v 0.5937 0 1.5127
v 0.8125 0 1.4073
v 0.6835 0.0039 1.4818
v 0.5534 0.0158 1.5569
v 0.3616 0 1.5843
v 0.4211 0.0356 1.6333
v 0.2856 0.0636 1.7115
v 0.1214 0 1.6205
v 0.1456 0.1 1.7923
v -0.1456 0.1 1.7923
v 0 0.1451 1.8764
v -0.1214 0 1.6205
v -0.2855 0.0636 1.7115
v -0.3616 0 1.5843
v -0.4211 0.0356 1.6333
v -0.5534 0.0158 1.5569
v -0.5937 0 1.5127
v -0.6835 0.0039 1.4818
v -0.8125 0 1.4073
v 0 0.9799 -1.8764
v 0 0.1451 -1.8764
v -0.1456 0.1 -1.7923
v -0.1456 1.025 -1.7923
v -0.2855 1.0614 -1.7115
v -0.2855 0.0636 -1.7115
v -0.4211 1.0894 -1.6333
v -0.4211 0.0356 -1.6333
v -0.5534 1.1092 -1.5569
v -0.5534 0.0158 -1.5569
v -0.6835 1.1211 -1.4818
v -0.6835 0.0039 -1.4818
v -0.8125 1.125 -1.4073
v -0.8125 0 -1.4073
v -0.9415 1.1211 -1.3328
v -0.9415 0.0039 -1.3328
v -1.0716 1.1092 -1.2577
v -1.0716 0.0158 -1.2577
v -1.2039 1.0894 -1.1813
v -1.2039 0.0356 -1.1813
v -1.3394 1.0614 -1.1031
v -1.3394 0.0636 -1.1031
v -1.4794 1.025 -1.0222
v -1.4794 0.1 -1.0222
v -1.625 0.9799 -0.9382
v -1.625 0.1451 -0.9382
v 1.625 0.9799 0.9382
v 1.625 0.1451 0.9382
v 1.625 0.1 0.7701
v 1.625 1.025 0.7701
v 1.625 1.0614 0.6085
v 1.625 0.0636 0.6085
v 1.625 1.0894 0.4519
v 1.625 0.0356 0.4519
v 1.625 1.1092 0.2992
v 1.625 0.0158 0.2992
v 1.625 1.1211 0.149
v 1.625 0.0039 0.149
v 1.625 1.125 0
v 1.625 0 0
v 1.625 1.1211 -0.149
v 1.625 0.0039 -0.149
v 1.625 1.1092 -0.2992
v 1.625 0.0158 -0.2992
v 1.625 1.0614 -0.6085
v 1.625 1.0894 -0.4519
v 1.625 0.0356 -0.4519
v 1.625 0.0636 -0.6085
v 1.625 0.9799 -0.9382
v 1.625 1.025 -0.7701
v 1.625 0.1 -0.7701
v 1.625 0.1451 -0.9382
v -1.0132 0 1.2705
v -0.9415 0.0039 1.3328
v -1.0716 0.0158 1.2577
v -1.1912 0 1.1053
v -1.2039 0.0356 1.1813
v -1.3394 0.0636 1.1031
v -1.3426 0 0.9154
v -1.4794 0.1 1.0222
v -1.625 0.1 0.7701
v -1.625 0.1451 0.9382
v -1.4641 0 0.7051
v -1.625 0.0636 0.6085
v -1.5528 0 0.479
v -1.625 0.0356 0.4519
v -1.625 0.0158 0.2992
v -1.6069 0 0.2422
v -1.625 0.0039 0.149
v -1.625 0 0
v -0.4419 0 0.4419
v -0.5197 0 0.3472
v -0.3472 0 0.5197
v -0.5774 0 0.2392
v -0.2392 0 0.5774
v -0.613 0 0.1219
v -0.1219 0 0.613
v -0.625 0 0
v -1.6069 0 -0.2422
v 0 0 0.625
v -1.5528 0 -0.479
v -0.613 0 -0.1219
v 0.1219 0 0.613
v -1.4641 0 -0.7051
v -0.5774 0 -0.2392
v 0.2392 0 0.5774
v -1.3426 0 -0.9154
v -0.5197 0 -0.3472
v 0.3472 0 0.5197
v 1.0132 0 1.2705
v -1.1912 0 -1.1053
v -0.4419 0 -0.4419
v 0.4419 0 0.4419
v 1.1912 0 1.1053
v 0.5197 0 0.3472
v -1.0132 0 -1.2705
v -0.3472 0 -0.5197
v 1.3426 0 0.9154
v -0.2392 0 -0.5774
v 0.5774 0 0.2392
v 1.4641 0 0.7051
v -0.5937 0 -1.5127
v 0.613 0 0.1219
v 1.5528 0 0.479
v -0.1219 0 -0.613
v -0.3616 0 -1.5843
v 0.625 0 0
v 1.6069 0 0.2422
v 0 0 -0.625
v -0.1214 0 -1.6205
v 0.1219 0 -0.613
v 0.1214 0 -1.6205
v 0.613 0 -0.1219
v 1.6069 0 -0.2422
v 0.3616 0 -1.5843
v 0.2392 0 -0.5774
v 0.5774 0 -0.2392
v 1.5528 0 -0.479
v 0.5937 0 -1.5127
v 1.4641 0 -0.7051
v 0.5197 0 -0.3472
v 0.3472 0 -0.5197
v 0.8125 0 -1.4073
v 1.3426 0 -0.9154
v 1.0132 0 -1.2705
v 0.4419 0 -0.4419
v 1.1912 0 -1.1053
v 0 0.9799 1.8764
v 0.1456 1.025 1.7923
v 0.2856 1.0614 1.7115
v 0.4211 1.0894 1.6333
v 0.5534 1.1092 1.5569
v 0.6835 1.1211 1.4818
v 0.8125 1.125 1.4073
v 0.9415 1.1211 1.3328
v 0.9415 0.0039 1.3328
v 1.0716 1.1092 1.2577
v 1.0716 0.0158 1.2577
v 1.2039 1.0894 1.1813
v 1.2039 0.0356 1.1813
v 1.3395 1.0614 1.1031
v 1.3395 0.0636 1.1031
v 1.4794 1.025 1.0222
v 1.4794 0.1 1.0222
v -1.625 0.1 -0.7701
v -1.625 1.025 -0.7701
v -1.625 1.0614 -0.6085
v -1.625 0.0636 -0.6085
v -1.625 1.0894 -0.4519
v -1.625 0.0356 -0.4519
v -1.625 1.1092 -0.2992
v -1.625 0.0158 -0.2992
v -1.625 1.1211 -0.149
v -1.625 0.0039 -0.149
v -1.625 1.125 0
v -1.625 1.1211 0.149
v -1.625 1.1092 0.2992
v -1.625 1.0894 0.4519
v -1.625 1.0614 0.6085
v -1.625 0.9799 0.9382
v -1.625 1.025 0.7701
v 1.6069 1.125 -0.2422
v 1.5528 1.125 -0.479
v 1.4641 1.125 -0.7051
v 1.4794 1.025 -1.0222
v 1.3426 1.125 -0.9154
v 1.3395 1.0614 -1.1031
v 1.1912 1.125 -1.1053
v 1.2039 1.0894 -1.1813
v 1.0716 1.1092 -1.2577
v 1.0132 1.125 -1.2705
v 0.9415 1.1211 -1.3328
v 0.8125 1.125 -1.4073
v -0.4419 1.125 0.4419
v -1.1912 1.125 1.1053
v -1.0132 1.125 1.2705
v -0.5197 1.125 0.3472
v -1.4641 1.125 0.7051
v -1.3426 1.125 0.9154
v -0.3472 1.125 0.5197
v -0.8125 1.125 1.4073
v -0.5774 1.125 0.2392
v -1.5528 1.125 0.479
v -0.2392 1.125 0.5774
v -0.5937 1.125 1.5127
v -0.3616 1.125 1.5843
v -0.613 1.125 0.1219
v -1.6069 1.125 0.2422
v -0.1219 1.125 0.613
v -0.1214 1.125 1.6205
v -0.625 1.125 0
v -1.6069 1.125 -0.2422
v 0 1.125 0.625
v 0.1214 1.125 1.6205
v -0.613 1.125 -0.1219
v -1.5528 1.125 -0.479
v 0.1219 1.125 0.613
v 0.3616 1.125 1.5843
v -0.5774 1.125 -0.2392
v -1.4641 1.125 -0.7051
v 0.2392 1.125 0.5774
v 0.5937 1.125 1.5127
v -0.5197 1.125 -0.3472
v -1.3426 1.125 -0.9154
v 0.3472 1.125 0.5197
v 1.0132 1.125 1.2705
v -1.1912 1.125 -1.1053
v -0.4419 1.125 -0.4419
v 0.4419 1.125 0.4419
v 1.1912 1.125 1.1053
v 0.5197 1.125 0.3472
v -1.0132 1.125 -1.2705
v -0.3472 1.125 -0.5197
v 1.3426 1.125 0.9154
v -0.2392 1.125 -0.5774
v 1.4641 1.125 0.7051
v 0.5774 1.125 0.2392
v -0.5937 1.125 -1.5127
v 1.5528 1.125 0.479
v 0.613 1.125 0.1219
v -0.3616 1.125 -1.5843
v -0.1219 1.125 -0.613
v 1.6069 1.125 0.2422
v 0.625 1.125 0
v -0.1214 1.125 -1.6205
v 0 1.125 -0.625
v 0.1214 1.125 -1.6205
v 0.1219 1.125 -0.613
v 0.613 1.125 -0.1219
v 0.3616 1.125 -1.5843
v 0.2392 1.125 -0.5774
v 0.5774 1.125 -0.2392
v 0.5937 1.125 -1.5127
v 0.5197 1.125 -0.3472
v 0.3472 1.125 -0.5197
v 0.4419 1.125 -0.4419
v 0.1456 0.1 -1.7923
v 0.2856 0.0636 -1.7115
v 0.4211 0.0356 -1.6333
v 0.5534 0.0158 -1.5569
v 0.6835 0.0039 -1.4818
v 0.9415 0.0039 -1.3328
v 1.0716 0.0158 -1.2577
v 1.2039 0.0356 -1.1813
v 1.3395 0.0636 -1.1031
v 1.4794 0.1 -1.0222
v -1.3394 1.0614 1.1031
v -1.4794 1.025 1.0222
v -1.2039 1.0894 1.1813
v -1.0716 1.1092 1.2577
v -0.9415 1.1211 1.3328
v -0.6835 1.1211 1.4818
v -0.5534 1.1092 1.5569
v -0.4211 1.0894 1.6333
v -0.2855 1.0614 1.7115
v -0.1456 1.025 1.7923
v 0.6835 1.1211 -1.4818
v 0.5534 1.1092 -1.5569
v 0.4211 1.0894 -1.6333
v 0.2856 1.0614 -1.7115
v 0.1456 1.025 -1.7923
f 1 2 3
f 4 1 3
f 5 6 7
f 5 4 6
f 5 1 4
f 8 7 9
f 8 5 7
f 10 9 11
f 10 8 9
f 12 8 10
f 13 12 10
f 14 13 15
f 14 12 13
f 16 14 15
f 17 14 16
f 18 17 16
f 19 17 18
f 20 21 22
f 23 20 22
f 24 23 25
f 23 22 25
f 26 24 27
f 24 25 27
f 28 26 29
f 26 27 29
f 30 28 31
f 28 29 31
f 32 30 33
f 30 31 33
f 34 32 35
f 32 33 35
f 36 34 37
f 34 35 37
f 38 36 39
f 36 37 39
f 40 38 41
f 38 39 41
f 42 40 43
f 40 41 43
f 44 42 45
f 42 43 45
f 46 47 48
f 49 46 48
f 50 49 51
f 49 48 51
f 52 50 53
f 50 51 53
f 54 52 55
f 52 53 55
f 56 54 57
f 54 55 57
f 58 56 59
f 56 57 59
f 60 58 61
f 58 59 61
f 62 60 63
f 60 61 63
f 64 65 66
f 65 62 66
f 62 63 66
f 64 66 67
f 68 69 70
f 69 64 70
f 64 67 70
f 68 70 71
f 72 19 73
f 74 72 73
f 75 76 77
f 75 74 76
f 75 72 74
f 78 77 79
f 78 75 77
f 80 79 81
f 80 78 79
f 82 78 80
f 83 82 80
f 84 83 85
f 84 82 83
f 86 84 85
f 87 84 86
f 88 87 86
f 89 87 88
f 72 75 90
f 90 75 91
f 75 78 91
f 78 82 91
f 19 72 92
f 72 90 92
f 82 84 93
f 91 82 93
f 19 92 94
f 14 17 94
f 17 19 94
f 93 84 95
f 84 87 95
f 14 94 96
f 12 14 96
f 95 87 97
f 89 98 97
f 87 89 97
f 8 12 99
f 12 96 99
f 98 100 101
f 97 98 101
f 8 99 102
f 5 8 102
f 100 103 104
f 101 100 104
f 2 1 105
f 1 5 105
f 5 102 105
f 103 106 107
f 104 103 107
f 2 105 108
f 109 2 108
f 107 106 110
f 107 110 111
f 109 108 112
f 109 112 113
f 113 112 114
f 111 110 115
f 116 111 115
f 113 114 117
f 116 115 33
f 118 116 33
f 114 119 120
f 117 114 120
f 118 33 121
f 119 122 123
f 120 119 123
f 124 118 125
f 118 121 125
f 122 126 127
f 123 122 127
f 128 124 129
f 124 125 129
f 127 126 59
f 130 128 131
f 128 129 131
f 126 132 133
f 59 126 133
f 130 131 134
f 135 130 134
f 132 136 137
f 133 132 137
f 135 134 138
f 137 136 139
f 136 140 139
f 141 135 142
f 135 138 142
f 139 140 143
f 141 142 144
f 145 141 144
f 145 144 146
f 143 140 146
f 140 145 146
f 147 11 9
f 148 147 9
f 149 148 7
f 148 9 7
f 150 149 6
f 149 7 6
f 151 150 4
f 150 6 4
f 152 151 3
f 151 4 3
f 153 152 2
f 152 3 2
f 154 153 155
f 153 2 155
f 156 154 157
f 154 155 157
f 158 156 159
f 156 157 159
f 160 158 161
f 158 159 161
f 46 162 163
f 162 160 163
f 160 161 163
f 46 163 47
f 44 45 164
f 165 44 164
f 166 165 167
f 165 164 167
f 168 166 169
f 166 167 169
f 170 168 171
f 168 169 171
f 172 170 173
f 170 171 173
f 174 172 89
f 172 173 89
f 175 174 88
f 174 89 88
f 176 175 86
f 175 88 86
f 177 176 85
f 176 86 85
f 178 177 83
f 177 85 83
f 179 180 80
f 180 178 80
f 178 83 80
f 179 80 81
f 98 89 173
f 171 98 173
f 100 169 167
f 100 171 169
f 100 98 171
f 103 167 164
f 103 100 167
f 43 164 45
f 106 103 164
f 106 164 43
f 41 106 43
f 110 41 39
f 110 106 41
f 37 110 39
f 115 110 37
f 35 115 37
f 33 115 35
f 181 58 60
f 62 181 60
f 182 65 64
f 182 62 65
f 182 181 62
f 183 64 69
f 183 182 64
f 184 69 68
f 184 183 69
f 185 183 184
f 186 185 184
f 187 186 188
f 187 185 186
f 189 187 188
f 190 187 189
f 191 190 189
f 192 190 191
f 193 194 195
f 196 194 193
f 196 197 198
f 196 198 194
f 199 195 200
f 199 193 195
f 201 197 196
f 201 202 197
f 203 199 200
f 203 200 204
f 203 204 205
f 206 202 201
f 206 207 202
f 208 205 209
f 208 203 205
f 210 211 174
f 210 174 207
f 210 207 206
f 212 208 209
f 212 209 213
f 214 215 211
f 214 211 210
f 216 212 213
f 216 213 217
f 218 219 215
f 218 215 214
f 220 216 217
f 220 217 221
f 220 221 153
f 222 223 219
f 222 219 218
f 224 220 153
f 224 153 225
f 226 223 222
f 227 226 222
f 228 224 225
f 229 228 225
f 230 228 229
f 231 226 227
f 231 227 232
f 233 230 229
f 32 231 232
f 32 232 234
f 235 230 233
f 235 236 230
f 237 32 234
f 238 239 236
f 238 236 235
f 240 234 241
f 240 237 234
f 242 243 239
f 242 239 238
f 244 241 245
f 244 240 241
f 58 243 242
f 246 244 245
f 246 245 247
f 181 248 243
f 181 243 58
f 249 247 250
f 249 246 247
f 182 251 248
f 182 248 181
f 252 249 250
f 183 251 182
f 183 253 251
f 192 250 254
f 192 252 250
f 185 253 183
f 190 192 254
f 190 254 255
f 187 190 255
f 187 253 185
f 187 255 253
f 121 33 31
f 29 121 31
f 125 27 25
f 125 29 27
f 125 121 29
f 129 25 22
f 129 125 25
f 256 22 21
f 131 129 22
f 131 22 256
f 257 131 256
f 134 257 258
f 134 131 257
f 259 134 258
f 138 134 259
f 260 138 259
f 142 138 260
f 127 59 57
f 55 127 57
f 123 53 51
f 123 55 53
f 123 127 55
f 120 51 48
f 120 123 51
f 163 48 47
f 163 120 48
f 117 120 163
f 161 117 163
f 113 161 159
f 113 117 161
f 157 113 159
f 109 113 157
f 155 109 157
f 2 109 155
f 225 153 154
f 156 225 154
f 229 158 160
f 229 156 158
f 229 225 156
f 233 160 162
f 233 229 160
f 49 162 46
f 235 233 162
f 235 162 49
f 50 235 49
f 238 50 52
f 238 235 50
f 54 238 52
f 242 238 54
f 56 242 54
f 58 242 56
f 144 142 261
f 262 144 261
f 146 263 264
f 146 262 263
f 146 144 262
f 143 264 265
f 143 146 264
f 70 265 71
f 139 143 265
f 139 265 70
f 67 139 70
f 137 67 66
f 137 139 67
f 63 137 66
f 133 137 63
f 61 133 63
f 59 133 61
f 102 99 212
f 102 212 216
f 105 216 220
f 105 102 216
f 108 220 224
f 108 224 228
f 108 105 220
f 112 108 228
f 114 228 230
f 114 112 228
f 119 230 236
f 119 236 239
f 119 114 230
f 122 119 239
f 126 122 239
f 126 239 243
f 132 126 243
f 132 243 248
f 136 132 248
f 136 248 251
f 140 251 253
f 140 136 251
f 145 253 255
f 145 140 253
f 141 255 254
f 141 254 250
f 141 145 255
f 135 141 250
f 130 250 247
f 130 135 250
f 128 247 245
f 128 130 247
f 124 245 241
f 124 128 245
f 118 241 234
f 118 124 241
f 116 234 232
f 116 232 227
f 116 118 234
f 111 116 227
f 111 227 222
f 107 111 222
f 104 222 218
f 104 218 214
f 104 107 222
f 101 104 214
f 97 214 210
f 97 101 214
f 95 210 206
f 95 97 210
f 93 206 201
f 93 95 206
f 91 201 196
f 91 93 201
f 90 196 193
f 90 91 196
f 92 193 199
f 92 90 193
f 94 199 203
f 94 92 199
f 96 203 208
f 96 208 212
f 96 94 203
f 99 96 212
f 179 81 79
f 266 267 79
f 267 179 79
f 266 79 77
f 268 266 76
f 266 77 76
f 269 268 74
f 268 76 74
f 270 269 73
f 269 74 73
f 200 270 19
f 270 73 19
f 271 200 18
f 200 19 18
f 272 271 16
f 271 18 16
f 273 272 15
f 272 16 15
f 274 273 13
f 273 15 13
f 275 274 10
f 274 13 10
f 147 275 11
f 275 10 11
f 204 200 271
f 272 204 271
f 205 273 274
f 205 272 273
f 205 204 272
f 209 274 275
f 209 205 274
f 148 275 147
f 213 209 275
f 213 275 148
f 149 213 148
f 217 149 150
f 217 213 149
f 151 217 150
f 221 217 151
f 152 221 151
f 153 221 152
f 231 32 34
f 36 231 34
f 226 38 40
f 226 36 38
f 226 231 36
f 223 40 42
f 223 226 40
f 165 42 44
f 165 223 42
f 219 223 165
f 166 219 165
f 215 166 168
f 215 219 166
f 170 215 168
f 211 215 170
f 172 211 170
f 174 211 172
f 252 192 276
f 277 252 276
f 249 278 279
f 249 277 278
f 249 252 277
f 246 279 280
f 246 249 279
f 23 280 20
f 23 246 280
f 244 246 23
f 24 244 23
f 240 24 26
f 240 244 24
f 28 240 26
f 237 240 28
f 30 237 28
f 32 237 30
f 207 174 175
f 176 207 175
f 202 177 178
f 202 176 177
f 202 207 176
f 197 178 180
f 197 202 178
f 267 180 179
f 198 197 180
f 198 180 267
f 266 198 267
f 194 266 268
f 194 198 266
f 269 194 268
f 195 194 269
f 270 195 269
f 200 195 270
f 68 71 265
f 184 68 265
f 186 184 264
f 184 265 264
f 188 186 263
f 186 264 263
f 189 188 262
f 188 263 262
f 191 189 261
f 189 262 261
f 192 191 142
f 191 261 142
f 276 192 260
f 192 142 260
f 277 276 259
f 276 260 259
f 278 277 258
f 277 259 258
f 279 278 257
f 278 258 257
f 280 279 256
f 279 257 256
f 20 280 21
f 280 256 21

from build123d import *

# Parameters (mm, degrees)
SKETCH1_R               = 0.625
BOSS_EXTRUDE1_DEPTH     = 1.125
SKETCH2_OUTSIDE_W       = 13.196
SKETCH2_OUTSIDE_H       = 13.698
SKETCH2_OUTSIDE_R       = 1.625
CUT_EXTRUDE1_DEPTH      = 2
CUT_EXTRUDE1_DRAFT      = -60
MIRROR1_COPY_1_SKETCH_W = 13.196
MIRROR1_COPY_1_SKETCH_H = 13.698
MIRROR1_COPY_1_SKETCH_R = 1.625
MIRROR1_COPY_1_DEPTH    = 2
MIRROR1_COPY_1_DRAFT    = -60


with BuildPart() as part:
    # Sketch1 → Boss-Extrude1 (new body)
    with BuildSketch(Plane(origin=(0, 0, 0), x_dir=(1, 0, 0), z_dir=(0, 1, 0))):
        Polygon((0, 1.876388375), (-1.625, 0.938194187), (-1.625, -0.938194187), (0, -1.876388375), (1.625, -0.938194187), (1.625, 0.938194187), align=None)
        with Locations(Location((0, 0, 0), (0, 0, 270))):
            Circle(SKETCH1_R, mode=Mode.SUBTRACT)
    extrude(amount=BOSS_EXTRUDE1_DEPTH)


with BuildPart() as cut_extrude1_tool:
    # Sketch2 outside → Cut-Extrude1 (with draft: the straight prism first)
    with BuildSketch(Plane(origin=(0, 1.125, 0), x_dir=(1, 0, 0), z_dir=(0, 1, 0))):
        Rectangle(SKETCH2_OUTSIDE_W, SKETCH2_OUTSIDE_H)
        Circle(SKETCH2_OUTSIDE_R, mode=Mode.SUBTRACT)
    extrude(amount=-CUT_EXTRUDE1_DEPTH)
    # Cut-Extrude1: the draft: its side faces are tilted about the plane it starts from
    cut_extrude1_sides = [cut_extrude1_tool.faces().sort_by_distance(p)[0] for p in [
        (0, 0.125, 6.849),
        (6.598, 0.125, 0),
        (0, 0.125, -6.849),
        (-6.598, 0.125, 0),
        (-1.625, 0.125, 0),
    ]]
    draft(cut_extrude1_sides, Plane(origin=(0, 1.125, 0), x_dir=(1, 0, 0), z_dir=(0, 1, 0)), CUT_EXTRUDE1_DRAFT)


with BuildPart() as part_1:
    add(part.part)

    # Cut-Extrude1: cut by cut_extrude1_tool
    add(cut_extrude1_tool.part, mode=Mode.SUBTRACT)


with BuildPart() as mirror1_copy_1_tool:
    # Mirror1 copy 1 sketch → Mirror1 copy 1 (with draft: the straight prism first)
    with BuildSketch(Plane.XZ):
        Rectangle(MIRROR1_COPY_1_SKETCH_W, MIRROR1_COPY_1_SKETCH_H)
        Circle(MIRROR1_COPY_1_SKETCH_R, mode=Mode.SUBTRACT)
    extrude(amount=-MIRROR1_COPY_1_DEPTH)
    # Mirror1 copy 1: the draft: its side faces are tilted about the plane it starts from
    mirror1_copy_1_sides = [mirror1_copy_1_tool.faces().sort_by_distance(p)[0] for p in [
        (0, 1, 6.849),
        (6.598, 1, 0),
        (0, 1, -6.849),
        (-6.598, 1, 0),
        (-1.625, 1, 0),
    ]]
    draft(mirror1_copy_1_sides, Plane.XZ, MIRROR1_COPY_1_DRAFT)


with BuildPart() as part_2:
    add(part_1.part)

    # Mirror1 copy 1: cut by mirror1_copy_1_tool
    add(mirror1_copy_1_tool.part, mode=Mode.SUBTRACT)


solid = part_2.part
